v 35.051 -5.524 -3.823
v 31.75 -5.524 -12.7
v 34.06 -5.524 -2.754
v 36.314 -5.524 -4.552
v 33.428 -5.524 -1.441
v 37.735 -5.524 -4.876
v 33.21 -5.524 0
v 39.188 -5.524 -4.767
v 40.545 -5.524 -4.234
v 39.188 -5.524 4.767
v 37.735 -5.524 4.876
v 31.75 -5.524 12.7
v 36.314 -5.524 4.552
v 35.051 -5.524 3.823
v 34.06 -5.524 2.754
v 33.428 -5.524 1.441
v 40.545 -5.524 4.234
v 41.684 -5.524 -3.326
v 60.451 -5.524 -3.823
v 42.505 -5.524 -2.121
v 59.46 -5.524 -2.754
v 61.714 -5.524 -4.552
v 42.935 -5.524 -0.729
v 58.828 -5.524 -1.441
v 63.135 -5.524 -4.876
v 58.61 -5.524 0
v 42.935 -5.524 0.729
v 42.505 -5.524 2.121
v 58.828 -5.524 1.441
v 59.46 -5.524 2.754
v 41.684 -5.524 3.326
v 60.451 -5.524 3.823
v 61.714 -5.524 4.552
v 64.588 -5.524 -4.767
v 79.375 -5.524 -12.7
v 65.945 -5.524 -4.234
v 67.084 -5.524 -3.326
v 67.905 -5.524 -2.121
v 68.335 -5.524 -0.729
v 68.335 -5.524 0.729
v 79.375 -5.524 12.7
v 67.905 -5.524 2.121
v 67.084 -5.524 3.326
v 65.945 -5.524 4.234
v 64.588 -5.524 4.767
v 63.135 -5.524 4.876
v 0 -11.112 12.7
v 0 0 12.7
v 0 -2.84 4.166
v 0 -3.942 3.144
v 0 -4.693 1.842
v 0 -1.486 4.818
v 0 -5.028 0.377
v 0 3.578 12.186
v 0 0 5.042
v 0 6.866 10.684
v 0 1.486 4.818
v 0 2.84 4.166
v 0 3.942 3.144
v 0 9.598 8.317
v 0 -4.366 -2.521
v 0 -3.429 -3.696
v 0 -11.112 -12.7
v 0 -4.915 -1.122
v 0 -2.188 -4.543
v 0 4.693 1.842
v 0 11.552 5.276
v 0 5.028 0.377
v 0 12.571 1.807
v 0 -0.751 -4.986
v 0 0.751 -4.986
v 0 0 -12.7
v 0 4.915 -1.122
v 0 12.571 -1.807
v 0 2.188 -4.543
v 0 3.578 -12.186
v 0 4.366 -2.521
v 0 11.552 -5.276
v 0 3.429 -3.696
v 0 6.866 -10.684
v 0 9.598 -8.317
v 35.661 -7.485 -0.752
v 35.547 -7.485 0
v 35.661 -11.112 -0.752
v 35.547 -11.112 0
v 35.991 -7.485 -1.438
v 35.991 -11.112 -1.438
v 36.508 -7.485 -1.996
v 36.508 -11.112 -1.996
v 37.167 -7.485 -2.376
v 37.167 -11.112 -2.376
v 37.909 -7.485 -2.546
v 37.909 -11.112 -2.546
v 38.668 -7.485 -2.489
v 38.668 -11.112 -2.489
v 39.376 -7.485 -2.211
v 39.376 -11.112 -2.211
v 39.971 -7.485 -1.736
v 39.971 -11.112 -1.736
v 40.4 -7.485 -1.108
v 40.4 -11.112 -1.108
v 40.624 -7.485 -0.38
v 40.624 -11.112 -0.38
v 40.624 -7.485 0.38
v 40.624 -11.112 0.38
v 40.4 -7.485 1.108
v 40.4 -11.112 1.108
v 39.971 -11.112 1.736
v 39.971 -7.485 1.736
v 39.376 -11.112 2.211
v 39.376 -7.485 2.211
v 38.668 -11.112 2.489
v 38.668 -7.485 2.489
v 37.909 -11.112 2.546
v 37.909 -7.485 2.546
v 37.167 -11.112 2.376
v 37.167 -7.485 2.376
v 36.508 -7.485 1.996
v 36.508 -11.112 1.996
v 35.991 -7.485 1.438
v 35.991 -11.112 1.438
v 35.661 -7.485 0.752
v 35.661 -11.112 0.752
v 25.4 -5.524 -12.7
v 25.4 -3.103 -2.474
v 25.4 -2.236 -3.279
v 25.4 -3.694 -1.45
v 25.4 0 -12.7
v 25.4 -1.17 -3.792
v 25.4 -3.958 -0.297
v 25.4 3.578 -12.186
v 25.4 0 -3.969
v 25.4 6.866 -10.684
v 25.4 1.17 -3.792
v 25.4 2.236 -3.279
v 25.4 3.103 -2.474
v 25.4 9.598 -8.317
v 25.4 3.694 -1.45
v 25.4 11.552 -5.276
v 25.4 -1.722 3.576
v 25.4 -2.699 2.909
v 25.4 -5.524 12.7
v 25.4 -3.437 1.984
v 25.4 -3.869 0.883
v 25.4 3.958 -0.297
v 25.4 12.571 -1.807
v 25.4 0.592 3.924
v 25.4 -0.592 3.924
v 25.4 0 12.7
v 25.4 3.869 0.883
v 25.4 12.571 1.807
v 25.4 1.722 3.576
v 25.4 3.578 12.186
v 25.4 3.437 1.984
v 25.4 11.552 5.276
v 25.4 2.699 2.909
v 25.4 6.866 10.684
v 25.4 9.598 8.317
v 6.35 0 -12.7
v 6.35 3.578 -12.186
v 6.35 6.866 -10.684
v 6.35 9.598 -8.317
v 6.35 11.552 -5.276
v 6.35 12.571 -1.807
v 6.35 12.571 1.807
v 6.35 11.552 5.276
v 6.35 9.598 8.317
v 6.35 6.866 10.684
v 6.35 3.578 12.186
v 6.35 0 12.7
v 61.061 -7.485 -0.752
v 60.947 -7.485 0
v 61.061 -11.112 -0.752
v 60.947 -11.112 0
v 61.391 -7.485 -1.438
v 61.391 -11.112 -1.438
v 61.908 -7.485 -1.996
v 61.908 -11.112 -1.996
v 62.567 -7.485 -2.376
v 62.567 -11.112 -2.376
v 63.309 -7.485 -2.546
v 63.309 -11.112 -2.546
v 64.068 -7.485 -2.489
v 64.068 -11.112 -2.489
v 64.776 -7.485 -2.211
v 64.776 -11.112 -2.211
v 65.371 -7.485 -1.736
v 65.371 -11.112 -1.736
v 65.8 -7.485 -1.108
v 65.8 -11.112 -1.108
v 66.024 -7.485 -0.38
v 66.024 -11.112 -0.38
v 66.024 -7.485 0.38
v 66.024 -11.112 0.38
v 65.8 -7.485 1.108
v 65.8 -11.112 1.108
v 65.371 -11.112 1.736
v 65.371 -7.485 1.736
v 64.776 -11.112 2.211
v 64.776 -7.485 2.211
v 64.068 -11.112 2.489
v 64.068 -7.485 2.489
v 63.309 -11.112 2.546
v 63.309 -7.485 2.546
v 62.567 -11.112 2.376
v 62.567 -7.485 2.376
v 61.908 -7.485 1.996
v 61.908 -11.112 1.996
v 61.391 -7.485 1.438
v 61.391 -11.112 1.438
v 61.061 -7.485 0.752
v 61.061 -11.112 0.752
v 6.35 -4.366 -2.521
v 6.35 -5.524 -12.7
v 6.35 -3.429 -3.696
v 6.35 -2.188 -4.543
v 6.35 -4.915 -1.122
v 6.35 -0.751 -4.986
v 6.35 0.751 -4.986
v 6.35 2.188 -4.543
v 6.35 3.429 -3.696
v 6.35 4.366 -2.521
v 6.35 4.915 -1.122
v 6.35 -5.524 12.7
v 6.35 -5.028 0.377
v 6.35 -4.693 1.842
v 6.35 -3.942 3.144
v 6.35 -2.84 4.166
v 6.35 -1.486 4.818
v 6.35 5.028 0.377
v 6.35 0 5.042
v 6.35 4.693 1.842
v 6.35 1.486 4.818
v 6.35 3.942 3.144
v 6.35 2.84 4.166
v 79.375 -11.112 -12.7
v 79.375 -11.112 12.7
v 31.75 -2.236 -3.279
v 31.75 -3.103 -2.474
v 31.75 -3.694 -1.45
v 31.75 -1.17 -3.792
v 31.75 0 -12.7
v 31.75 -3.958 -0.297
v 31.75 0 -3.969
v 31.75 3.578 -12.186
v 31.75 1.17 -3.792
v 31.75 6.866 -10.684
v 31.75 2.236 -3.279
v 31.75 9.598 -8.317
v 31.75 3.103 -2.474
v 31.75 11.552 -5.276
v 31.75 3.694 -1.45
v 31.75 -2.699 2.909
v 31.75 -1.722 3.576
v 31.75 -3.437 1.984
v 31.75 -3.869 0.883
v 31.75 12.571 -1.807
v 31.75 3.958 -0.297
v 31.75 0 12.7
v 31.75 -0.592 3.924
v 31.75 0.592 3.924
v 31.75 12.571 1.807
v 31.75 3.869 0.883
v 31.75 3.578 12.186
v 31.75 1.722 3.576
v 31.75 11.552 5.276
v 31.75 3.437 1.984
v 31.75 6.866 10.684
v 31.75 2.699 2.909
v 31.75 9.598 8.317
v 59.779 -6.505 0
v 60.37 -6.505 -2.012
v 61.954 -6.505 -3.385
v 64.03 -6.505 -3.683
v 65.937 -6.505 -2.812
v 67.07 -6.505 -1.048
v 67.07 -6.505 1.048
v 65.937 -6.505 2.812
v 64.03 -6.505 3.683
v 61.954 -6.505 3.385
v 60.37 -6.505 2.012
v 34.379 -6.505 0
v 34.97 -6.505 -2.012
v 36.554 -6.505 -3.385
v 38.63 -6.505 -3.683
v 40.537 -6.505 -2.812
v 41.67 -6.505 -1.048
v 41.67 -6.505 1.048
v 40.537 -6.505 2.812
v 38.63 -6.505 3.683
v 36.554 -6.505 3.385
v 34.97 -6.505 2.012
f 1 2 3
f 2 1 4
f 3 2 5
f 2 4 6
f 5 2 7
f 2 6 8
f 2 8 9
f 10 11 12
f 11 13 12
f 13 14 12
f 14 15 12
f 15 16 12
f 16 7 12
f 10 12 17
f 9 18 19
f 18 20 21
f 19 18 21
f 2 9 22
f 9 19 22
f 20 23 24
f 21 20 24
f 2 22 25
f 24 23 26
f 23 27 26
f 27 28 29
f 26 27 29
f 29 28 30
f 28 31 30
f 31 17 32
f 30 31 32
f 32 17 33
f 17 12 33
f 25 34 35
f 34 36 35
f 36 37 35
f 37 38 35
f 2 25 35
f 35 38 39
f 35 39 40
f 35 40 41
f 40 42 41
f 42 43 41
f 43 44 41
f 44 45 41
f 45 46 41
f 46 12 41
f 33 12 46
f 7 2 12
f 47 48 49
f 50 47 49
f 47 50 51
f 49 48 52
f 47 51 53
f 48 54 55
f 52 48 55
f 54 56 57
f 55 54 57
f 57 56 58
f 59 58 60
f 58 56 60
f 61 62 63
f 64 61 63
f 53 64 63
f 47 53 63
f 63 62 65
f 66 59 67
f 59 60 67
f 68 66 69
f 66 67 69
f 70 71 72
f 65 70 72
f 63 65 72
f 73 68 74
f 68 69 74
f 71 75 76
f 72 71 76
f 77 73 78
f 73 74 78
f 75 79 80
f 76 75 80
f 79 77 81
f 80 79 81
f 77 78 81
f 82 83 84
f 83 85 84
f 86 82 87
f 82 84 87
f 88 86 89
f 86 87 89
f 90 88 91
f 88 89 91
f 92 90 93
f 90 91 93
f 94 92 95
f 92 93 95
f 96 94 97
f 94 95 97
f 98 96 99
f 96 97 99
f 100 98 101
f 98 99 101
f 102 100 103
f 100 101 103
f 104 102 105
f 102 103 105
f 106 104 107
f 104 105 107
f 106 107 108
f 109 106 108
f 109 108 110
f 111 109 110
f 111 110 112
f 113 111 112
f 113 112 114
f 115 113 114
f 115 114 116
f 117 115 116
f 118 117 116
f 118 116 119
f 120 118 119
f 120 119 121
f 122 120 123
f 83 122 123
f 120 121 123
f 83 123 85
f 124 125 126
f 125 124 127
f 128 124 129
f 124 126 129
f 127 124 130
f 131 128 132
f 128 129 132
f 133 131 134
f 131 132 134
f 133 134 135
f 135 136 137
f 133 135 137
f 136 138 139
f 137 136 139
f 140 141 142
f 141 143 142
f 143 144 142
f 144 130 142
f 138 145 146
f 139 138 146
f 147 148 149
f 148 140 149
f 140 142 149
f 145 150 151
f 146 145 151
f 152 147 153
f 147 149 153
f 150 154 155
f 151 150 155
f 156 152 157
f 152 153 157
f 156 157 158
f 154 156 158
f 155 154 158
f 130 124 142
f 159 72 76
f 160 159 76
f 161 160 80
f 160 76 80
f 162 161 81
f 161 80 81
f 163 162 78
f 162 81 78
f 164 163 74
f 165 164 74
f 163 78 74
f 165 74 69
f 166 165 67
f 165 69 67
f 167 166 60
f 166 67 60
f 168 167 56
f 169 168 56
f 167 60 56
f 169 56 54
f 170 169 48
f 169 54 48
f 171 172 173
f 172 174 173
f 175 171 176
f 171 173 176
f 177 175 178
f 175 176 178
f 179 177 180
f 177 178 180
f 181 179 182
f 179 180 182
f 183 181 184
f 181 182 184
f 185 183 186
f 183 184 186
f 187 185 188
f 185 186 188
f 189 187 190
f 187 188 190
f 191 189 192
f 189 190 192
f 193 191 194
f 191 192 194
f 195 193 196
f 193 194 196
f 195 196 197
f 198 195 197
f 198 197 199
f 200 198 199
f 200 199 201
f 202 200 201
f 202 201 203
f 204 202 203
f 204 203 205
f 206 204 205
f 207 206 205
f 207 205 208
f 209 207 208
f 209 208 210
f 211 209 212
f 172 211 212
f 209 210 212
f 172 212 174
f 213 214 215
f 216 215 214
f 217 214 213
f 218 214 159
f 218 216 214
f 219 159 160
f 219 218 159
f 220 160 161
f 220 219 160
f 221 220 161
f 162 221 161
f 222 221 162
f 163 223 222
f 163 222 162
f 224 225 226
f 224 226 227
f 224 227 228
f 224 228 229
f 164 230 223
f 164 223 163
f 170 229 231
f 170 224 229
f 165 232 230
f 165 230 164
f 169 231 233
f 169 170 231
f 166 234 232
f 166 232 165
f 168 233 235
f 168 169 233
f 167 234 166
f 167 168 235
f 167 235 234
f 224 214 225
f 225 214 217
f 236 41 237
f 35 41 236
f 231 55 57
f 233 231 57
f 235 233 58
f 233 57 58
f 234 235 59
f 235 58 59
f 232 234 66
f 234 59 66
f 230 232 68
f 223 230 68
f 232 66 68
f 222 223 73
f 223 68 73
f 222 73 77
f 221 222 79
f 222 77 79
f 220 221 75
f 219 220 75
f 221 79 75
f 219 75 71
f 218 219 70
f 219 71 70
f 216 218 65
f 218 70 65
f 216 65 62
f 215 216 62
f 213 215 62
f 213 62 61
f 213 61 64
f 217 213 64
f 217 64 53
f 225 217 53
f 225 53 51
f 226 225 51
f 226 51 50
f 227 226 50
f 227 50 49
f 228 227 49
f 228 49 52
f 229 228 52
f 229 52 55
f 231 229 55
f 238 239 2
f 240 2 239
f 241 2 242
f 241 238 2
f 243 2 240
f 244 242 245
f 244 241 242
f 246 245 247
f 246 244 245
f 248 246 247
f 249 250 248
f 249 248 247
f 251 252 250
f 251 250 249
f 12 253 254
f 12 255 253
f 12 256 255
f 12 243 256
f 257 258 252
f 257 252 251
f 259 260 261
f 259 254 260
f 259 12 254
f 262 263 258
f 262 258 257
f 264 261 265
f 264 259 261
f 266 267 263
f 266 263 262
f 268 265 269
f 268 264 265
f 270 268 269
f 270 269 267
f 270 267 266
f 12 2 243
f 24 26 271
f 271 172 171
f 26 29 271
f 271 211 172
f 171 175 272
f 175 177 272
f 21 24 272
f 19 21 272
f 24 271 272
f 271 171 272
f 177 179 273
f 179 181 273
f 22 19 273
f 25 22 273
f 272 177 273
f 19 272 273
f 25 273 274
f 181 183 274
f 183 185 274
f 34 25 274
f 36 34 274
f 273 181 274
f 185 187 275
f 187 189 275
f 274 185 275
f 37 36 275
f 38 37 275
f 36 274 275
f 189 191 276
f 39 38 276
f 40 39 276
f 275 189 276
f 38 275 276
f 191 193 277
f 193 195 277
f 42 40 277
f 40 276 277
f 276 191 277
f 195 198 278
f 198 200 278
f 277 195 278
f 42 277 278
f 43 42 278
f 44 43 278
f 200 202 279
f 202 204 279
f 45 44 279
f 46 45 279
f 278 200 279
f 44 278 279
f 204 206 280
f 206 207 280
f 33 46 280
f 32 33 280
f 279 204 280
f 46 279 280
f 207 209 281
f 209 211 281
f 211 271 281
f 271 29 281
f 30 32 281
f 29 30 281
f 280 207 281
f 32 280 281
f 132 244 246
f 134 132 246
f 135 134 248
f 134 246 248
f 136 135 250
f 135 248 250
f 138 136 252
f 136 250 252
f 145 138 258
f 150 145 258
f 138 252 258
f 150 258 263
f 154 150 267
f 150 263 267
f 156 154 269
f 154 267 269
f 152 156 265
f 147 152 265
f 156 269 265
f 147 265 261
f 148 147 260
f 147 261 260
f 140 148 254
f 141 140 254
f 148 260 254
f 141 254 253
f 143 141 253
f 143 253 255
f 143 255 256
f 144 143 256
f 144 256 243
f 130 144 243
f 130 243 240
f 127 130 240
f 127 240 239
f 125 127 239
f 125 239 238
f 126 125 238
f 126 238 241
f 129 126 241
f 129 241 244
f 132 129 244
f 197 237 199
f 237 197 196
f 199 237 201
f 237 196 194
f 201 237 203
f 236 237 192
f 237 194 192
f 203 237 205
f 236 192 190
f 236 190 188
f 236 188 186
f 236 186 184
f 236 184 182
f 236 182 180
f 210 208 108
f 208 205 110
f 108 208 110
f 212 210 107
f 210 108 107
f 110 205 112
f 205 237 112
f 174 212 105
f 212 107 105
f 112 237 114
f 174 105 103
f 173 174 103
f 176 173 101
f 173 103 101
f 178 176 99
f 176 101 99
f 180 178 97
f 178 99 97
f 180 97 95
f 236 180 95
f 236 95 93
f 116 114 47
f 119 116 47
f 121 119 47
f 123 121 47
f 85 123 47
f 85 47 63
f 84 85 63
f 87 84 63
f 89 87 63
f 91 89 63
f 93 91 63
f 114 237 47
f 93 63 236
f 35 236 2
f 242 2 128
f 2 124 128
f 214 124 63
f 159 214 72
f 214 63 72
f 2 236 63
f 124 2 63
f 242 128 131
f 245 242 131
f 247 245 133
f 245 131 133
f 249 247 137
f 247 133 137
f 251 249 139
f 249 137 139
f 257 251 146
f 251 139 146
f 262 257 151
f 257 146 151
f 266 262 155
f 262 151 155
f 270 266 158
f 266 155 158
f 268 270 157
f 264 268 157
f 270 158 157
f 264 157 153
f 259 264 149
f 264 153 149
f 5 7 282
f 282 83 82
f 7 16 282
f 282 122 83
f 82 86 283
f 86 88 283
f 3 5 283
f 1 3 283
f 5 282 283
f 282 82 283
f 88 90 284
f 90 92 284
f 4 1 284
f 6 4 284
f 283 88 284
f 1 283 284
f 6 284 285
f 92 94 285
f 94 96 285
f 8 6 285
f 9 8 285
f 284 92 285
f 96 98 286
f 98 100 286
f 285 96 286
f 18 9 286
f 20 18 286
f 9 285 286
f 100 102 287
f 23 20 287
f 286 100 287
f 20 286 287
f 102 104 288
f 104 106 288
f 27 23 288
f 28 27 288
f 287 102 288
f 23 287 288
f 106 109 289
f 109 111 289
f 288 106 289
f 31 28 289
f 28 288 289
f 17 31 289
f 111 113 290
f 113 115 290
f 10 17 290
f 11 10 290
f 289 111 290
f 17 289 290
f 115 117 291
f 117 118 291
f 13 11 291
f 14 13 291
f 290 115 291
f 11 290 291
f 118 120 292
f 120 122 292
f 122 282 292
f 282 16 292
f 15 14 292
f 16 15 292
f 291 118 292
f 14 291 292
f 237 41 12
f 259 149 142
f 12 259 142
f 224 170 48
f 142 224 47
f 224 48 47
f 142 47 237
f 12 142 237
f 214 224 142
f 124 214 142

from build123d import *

# Parameters (mm, degrees)
SKETCH1_R                                          = 1.5875
BOSS_EXTRUDE1_DEPTH                                = 79.375
SKETCH2_W                                          = 19.05
SKETCH2_H                                          = 18.2245
SKETCH2_W_2                                        = 47.625
CUT_EXTRUDE1_DEPTH                                 = 85.302079601
CSK_FOR_10_FLAT_HEAD_MACHINE_SCREW_100_D           = 5.1054
CSK_FOR_10_FLAT_HEAD_MACHINE_SCREW_100_CSINK_D     = 9.779
CSK_FOR_10_FLAT_HEAD_MACHINE_SCREW_100_CSINK_ANGLE = 100
TAP_DRILL_FOR_3_8_16_TAP1_REACH                    = 52.899
TAP_DRILL_FOR_3_8_16_TAP1_BORE_R                   = 3.96875
F_3_8_CLEARANCE_HOLE1_REACH                        = 83.382
F_3_8_CLEARANCE_HOLE1_BORE_R                       = 5.0419


with BuildPart() as part:
    # Sketch1 → Boss-Extrude1 (new body)
    with BuildSketch(Plane(origin=(0, 0, 0), x_dir=(0, 0, -1), z_dir=(1, 0, 0))):
        with BuildLine():
            Line((-12.7, 0), (-12.7, -11.1125))
            Line((-12.7, -11.1125), (12.7, -11.1125))
            Line((12.7, -11.1125), (12.7, 0))
            ThreePointArc((12.7, 0), (0, 12.7), (-12.7, 0))
        make_face()
        with Locations(Location((0, 0, 0), (0, 0, 180))):
            Circle(SKETCH1_R, mode=Mode.SUBTRACT)
    extrude(amount=BOSS_EXTRUDE1_DEPTH)

    # Sketch2 → Cut-Extrude1 (cut, through all)
    with BuildSketch(Plane.XY.offset(12.7)):
        with Locations((15.875, 3.58775)):
            Rectangle(SKETCH2_W, SKETCH2_H)
        with Locations((55.5625, 3.58775)):
            Rectangle(SKETCH2_W_2, SKETCH2_H)
    extrude(amount=-CUT_EXTRUDE1_DEPTH, mode=Mode.SUBTRACT)

    # CSK for _10 Flat Head Machine Screw _100 (through all)
    with Locations(Plane(origin=(0, -5.5245, 0), x_dir=(1, 0, 0), z_dir=(0, 1, 0))):
        with Locations((38.1, 0), (63.5, 0)):
            CounterSinkHole(CSK_FOR_10_FLAT_HEAD_MACHINE_SCREW_100_D / 2, CSK_FOR_10_FLAT_HEAD_MACHINE_SCREW_100_CSINK_D / 2, counter_sink_angle=CSK_FOR_10_FLAT_HEAD_MACHINE_SCREW_100_CSINK_ANGLE)

    # Tap Drill for 3/8-16 Tap1 bore → Tap Drill for 3/8-16 Tap1 (cut, up to next)
    with BuildSketch(Plane(origin=(31.75, 0, 0), x_dir=(0, 0, -1), z_dir=(1, 0, 0)), mode=Mode.PRIVATE) as tap_drill_for_3_8_16_tap1_sk1:
        Circle(TAP_DRILL_FOR_3_8_16_TAP1_BORE_R)
    tap_drill_for_3_8_16_tap1_tool1 = extrude(tap_drill_for_3_8_16_tap1_sk1.sketch, amount=-TAP_DRILL_FOR_3_8_16_TAP1_REACH, mode=Mode.PRIVATE) & part.part
    add(tap_drill_for_3_8_16_tap1_tool1.solids().sort_by_distance((31.75, 0, 0))[0], mode=Mode.SUBTRACT)

    # 3/8 Clearance Hole1 bore → 3/8 Clearance Hole1 (cut, up to next)
    with BuildSketch(Plane.ZY, mode=Mode.PRIVATE) as f_3_8_clearance_hole1_sk1:
        Circle(F_3_8_CLEARANCE_HOLE1_BORE_R)
    f_3_8_clearance_hole1_tool1 = extrude(f_3_8_clearance_hole1_sk1.sketch, amount=-F_3_8_CLEARANCE_HOLE1_REACH, mode=Mode.PRIVATE) & part.part
    add(f_3_8_clearance_hole1_tool1.solids().sort_by_distance((0, 0, 0))[0], mode=Mode.SUBTRACT)


solid = part.part
